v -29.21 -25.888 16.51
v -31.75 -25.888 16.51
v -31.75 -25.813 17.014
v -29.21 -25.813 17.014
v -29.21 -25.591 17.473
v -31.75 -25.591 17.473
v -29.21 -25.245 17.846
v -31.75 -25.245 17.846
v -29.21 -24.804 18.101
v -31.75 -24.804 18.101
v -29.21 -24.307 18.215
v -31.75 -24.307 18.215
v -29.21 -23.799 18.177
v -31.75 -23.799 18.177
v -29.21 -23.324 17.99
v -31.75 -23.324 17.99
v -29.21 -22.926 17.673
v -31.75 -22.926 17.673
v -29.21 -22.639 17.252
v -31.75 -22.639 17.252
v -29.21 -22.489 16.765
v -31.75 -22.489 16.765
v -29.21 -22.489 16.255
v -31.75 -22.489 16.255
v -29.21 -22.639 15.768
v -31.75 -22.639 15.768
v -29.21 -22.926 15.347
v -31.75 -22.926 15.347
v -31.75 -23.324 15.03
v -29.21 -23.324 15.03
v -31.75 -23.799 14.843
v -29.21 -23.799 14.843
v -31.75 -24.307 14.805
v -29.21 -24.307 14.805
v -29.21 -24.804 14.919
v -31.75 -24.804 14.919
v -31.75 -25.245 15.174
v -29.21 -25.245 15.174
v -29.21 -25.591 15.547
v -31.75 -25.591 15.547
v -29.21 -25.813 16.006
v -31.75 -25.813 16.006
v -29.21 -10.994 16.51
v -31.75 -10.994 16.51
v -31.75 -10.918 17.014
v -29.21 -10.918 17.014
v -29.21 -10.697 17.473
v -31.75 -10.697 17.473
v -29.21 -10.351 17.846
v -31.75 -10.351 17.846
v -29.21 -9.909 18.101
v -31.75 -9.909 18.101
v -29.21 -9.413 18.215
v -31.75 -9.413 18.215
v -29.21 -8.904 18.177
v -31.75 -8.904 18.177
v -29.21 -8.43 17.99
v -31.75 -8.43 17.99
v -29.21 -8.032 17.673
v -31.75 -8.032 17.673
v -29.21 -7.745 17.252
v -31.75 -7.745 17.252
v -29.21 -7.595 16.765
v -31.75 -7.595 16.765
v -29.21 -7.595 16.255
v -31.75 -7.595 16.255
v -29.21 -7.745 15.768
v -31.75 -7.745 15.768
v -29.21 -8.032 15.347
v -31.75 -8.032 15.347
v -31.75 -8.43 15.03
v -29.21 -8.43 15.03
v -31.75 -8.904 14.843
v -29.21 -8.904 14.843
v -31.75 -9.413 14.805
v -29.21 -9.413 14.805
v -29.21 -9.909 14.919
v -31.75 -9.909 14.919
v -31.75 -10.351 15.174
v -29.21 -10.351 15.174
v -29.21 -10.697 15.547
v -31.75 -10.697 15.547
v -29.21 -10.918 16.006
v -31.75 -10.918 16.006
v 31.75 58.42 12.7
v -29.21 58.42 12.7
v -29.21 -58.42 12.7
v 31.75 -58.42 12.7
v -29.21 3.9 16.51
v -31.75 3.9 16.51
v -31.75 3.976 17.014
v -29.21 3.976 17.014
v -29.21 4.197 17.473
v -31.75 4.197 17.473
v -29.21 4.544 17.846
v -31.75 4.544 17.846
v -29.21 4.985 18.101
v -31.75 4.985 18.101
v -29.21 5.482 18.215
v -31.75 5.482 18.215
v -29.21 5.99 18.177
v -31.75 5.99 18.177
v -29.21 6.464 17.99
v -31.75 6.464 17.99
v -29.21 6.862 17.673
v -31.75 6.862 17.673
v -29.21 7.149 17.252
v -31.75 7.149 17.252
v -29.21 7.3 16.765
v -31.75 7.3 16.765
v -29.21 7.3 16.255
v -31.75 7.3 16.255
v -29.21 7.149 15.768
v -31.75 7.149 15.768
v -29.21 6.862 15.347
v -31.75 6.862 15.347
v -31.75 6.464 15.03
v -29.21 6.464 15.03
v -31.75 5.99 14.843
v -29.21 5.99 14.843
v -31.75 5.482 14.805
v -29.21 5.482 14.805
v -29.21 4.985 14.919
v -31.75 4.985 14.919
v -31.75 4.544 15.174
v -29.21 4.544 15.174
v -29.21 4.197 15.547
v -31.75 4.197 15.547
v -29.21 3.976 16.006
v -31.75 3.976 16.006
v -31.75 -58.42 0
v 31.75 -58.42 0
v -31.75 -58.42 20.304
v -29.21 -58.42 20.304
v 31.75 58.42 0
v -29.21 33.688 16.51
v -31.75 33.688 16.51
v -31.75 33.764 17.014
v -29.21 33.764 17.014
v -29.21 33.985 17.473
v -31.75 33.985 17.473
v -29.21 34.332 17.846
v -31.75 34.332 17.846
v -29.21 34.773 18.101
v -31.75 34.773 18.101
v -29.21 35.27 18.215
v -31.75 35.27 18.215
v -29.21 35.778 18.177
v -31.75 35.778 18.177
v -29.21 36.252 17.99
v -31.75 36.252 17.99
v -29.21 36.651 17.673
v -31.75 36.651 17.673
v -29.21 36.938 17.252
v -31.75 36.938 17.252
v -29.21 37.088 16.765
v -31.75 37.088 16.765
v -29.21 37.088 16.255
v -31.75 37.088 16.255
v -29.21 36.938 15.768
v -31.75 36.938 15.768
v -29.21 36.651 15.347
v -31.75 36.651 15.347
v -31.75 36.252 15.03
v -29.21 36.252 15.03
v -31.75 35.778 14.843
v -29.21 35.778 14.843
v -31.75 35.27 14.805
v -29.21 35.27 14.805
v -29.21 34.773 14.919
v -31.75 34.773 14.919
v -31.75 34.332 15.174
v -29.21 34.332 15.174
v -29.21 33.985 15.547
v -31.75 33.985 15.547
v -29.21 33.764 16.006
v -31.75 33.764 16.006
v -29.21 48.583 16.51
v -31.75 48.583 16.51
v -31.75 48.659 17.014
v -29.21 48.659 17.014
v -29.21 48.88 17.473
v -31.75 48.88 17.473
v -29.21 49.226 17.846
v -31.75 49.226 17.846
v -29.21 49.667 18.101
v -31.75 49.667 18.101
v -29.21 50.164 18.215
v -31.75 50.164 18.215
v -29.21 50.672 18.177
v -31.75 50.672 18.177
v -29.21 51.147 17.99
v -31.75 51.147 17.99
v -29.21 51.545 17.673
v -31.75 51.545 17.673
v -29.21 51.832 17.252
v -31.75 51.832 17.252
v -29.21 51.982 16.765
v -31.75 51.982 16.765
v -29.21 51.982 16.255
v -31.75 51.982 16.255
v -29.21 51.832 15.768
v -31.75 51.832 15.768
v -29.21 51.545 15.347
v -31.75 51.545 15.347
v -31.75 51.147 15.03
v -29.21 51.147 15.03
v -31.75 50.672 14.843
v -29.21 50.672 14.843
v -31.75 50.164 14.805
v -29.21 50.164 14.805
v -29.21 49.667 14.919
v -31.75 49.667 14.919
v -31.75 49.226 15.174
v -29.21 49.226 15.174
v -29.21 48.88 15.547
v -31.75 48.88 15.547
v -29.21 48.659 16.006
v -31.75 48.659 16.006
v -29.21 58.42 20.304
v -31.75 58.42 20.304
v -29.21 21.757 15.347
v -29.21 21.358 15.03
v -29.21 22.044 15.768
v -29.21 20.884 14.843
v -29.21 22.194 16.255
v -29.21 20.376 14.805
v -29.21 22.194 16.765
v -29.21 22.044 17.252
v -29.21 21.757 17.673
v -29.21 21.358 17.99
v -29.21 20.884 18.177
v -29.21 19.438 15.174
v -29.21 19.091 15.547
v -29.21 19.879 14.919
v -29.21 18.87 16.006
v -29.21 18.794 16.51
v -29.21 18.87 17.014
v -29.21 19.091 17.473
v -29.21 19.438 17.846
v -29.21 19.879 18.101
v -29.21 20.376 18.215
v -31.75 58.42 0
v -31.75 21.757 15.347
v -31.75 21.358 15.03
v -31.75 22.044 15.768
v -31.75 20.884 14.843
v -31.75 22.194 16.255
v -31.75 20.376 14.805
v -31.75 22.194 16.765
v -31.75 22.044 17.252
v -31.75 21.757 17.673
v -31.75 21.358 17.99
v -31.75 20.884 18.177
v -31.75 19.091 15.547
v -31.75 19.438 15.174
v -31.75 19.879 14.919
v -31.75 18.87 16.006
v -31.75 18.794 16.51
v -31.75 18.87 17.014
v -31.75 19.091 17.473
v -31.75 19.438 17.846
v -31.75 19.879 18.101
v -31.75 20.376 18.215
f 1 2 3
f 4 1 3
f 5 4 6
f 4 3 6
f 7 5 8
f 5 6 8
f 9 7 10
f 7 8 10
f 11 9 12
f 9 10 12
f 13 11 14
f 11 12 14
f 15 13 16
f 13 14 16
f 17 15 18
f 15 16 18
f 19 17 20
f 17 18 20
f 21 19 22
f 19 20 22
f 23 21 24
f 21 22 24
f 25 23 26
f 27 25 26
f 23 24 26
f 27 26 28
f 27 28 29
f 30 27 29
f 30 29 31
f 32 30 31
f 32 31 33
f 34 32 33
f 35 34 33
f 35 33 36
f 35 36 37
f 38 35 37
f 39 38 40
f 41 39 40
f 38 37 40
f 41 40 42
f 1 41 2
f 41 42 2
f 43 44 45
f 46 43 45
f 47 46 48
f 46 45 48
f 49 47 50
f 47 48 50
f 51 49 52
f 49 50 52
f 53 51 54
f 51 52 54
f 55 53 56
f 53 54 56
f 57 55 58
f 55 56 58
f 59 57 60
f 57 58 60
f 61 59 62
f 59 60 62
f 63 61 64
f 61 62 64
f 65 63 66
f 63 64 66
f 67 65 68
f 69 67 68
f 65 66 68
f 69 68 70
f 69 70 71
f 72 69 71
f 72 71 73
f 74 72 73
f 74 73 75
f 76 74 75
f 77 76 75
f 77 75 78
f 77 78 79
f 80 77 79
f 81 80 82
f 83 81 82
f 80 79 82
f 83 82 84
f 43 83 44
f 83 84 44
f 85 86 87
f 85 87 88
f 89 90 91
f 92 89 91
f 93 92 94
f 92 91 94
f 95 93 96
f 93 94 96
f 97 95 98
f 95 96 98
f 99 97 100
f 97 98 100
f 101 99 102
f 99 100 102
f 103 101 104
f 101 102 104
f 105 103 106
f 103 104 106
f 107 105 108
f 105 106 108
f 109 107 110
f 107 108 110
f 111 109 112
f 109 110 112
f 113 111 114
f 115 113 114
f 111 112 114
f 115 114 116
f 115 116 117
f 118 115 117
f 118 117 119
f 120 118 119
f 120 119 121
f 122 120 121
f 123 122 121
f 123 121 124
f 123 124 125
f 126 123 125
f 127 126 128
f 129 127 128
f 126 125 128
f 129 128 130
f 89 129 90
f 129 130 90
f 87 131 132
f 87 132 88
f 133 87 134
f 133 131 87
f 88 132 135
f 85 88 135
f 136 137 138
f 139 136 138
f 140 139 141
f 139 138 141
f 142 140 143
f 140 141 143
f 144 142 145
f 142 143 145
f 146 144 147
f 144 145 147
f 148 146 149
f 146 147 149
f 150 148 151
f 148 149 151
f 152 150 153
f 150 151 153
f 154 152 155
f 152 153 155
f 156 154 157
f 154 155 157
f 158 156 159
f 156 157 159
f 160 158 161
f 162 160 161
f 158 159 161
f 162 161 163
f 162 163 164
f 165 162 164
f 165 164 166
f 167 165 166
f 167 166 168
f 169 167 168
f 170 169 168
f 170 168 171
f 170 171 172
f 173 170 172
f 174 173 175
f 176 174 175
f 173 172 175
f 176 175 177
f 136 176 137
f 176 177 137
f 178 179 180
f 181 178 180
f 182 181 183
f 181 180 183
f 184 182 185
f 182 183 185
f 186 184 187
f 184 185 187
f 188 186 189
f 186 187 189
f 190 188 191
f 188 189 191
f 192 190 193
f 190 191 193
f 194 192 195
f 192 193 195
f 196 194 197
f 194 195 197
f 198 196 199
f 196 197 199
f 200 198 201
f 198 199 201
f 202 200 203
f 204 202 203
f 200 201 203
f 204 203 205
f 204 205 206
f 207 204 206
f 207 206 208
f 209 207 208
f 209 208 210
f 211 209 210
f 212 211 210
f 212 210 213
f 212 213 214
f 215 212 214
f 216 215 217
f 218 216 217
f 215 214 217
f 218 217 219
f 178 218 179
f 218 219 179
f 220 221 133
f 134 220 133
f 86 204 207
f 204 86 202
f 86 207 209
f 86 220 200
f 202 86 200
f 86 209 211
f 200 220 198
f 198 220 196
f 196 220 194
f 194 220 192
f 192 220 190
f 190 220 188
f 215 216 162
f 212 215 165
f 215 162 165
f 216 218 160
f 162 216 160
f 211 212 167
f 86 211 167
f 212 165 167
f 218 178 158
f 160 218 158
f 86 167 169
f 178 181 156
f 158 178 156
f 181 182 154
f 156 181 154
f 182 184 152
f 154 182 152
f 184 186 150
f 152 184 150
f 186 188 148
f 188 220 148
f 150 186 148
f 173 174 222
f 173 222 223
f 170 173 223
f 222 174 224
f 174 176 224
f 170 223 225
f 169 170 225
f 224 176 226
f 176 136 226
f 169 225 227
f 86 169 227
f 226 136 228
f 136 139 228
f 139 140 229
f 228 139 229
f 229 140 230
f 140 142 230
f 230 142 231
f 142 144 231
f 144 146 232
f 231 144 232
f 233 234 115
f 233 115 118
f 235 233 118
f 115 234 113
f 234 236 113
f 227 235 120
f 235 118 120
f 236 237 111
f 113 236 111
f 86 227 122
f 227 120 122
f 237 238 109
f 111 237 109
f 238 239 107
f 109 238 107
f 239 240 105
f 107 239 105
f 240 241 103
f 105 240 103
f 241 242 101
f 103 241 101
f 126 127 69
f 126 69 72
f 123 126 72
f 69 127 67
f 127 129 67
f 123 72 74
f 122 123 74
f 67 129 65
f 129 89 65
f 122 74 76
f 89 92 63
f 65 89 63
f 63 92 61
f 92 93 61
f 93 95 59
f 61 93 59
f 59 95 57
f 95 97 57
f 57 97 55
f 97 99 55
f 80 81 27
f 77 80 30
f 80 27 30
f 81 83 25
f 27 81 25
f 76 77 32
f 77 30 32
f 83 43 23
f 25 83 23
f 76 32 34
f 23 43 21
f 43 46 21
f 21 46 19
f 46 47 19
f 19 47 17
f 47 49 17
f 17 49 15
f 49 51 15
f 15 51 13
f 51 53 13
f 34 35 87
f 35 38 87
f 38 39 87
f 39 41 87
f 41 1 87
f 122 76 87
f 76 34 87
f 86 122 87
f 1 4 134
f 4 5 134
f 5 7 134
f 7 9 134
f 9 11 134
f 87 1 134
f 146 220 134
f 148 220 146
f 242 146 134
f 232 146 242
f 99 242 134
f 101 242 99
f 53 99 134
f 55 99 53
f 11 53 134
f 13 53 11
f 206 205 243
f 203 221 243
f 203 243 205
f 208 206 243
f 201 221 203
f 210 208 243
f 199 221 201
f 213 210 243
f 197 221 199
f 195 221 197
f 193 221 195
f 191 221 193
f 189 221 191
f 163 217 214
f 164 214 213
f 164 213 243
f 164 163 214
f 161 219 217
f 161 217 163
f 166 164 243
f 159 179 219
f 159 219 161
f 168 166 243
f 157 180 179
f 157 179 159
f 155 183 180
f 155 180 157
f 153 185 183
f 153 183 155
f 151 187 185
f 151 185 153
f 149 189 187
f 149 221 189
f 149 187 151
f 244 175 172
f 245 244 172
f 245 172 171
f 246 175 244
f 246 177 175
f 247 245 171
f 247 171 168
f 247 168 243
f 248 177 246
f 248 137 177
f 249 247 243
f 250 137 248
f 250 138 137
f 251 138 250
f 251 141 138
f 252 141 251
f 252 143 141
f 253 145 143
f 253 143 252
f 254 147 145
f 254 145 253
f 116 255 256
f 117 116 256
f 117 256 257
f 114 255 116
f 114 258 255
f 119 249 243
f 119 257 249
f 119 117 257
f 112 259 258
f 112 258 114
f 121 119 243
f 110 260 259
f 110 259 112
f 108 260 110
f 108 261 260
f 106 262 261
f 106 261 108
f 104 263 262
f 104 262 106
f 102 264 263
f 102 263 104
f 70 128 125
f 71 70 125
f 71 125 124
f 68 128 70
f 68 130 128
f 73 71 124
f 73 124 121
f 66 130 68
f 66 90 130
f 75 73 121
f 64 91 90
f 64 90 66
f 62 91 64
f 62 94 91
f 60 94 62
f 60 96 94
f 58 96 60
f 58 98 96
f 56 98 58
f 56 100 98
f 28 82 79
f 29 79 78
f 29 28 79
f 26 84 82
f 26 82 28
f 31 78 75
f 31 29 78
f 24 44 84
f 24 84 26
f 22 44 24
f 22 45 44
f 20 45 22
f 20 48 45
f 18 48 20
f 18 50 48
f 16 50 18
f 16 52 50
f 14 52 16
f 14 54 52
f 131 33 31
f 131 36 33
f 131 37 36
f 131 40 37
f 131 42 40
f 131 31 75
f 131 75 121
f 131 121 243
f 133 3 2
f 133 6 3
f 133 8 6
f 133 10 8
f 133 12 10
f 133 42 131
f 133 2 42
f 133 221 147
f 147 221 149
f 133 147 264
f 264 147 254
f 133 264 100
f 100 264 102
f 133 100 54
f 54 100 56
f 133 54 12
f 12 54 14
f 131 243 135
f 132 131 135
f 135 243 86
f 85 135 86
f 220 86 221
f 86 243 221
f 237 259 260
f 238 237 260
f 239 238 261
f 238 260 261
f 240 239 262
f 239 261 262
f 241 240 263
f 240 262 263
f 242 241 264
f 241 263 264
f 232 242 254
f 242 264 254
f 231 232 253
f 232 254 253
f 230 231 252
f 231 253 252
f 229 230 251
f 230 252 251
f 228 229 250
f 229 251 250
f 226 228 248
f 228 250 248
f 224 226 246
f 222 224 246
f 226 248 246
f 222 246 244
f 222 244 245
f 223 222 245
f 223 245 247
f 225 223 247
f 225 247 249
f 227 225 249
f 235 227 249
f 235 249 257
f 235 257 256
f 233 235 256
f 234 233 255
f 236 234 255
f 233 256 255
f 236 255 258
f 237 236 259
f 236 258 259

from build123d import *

# Parameters (mm, degrees)
F0_W     = 63.5
F0_H     = 116.84
F1_DEPTH = 12.7
F2_W     = 116.84
F2_H     = 7.6035529703
F2_R     = 1.7093941464
F3_DEPTH = 2.54


with BuildPart() as f1:
    # F0 (on Top) → F1 (new body)
    with BuildSketch(Plane.XY):
        Rectangle(F0_W, F0_H)
    extrude(amount=F1_DEPTH)

    # F2 (on face) → F3 (join)
    with BuildSketch(Plane(origin=(-31.75, 0, 0), x_dir=(0, -1, 0), z_dir=(-1, 0, 0))):
        with Locations((0, 16.5017764851)):
            Rectangle(F2_W, F2_H)
        with Locations((-50.292, 16.51)):
            Circle(F2_R, mode=Mode.SUBTRACT)
        with Locations((-35.3977816476, 16.51)):
            Circle(F2_R, mode=Mode.SUBTRACT)
        with Locations((-20.5035632952, 16.51)):
            Circle(F2_R, mode=Mode.SUBTRACT)
        with Locations((-5.6093449428, 16.51)):
            Circle(F2_R, mode=Mode.SUBTRACT)
        with Locations((9.2848734097, 16.51)):
            Circle(F2_R, mode=Mode.SUBTRACT)
        with Locations((24.1790917621, 16.51)):
            Circle(F2_R, mode=Mode.SUBTRACT)
    extrude(amount=-F3_DEPTH)


solid = f1.part
